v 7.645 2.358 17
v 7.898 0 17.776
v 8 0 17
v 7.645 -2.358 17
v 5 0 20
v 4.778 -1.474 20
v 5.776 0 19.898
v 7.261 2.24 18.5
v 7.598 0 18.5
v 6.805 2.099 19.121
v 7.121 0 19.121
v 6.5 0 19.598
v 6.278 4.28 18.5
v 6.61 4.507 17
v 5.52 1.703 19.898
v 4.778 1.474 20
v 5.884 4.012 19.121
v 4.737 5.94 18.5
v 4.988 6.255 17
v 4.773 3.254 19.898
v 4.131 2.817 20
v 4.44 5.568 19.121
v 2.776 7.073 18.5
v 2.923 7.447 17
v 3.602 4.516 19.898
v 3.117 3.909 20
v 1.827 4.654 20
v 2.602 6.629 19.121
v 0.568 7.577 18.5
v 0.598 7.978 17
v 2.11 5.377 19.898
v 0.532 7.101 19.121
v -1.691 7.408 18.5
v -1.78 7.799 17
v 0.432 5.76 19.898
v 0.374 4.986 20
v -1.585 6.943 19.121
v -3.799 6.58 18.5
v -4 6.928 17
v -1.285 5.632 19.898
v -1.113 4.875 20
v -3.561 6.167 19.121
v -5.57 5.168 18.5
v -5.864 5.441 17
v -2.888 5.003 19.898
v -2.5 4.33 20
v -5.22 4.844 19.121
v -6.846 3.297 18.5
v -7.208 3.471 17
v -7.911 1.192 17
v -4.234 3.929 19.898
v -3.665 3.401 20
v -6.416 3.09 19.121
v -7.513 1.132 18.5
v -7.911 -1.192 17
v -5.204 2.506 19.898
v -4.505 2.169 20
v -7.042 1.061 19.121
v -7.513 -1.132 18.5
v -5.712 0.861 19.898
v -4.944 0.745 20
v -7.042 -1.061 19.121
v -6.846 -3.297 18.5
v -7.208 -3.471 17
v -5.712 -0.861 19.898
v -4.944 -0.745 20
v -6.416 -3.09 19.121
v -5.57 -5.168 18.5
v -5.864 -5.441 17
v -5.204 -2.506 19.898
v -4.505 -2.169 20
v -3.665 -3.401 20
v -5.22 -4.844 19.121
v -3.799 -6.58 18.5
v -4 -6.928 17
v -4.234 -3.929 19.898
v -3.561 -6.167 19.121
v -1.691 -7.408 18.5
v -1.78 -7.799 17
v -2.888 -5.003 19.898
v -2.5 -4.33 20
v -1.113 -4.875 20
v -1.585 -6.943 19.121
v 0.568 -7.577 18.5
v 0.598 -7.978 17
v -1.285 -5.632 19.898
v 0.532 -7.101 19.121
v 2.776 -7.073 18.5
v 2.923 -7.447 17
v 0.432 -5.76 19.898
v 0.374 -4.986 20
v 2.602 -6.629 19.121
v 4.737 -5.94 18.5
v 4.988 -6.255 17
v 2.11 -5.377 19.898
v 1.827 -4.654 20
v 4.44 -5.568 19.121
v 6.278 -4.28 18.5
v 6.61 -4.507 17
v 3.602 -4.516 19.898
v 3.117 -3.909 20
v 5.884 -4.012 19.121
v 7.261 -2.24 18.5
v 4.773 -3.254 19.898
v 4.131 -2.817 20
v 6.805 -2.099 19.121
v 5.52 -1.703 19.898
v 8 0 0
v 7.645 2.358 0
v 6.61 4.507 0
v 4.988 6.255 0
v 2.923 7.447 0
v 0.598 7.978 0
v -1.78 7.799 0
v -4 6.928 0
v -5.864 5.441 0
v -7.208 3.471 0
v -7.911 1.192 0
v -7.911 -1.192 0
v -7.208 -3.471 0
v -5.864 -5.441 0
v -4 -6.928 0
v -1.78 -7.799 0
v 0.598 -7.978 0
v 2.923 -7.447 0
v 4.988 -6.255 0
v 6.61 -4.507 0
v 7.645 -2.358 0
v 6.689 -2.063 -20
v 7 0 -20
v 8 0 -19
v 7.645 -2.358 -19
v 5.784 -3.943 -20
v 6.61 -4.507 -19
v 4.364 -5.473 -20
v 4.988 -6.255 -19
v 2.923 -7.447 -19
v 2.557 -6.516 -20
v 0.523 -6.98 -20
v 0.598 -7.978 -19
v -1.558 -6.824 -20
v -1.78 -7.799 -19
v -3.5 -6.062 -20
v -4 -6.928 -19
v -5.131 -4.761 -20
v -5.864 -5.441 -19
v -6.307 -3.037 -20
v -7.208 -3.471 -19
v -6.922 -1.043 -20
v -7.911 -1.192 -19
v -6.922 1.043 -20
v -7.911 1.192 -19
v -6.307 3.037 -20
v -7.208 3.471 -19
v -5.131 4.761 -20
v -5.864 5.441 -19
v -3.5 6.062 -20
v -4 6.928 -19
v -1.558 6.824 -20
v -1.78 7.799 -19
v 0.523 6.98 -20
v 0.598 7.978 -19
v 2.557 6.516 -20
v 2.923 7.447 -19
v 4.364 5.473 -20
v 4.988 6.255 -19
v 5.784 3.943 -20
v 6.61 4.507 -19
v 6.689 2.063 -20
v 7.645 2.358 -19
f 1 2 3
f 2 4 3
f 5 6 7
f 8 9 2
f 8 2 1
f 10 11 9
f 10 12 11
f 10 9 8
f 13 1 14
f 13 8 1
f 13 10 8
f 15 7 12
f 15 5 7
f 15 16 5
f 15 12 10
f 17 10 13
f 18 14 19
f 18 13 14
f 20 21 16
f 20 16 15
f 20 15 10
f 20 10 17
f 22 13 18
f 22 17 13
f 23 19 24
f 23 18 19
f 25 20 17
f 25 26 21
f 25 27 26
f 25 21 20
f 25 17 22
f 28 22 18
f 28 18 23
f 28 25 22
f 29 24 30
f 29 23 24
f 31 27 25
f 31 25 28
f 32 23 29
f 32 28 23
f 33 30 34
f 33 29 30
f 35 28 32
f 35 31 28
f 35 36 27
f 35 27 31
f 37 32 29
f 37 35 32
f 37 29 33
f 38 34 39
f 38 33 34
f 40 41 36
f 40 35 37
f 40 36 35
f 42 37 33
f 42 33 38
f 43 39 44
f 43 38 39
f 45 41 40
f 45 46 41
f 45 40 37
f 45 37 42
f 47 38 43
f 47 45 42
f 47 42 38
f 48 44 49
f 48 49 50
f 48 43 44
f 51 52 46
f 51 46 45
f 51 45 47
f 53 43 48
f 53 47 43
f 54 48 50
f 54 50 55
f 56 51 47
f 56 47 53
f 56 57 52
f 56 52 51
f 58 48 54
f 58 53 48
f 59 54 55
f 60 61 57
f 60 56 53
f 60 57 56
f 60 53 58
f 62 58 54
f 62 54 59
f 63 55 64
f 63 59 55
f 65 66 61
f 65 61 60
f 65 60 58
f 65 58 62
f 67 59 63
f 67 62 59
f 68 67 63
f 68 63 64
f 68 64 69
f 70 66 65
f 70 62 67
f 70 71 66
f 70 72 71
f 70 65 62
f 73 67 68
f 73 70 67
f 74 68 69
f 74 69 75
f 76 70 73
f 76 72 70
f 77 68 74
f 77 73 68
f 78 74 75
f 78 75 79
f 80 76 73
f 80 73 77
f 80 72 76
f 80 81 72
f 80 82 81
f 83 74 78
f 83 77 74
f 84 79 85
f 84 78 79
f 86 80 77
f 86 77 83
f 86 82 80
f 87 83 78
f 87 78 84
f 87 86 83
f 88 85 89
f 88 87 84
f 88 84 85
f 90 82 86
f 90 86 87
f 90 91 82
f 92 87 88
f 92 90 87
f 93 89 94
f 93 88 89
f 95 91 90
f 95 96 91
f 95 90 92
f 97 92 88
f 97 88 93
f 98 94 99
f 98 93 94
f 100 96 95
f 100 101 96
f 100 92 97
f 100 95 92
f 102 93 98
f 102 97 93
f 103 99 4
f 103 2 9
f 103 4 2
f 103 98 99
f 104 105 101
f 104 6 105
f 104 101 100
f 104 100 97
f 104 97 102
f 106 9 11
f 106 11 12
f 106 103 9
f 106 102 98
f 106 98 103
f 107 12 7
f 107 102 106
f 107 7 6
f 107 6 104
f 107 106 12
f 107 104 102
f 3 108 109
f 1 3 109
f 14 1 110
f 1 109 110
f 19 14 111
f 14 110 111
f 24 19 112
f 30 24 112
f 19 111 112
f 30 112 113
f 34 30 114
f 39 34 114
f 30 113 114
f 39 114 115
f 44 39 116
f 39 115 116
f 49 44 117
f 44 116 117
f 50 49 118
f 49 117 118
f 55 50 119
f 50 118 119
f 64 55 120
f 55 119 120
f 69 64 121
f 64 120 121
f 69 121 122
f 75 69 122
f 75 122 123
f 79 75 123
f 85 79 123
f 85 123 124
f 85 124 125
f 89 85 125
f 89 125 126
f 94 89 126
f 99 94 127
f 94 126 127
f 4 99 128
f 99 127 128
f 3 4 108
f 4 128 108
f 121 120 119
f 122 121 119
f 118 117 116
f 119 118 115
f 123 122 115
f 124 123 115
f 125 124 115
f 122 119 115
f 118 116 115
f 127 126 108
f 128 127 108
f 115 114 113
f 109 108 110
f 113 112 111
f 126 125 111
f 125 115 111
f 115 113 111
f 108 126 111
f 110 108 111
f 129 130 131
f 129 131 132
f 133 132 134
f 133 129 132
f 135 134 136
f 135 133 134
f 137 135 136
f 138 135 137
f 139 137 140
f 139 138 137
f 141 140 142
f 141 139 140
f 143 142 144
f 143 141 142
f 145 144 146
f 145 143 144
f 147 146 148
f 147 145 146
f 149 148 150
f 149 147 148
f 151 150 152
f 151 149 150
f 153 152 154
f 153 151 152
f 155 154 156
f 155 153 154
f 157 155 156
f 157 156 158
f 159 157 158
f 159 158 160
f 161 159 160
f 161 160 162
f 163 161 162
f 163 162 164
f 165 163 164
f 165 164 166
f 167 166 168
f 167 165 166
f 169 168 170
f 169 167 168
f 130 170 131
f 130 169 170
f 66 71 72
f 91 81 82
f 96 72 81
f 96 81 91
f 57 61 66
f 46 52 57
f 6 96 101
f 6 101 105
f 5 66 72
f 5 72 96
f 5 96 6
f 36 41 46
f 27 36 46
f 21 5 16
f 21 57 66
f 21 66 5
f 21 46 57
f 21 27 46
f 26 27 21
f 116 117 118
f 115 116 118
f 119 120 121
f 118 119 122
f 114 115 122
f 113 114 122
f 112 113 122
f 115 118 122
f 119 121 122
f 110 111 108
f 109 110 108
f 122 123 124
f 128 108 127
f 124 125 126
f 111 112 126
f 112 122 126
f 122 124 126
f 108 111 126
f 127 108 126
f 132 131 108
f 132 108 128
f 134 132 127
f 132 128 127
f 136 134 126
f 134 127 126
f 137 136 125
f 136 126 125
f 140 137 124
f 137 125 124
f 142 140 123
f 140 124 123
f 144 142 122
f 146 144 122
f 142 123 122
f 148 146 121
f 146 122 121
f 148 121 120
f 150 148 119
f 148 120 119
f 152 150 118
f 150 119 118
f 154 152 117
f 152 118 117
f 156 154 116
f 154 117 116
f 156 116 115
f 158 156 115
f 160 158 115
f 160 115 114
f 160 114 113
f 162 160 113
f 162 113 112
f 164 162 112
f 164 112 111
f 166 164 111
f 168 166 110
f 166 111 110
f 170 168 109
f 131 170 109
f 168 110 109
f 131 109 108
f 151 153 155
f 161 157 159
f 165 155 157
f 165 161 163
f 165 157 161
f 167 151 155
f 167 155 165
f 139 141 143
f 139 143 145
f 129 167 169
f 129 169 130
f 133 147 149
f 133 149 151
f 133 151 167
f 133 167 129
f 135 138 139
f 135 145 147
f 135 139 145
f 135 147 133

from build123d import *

# Parameters (mm, degrees)
F0_R      = 8
F1_DEPTH  = 20
F2_R      = 3
F1_FACE_R = 8
F3_DEPTH  = 20
F4_SIZE   = 1


with BuildPart() as f1:
    # F0 (on Top) → F1 (new body)
    with BuildSketch(Plane.XY):
        Circle(F0_R)
    extrude(amount=F1_DEPTH)

    # F2
    f2_edges = [f1.edges().sort_by_distance(p)[0] for p in [
        (-8, 0, 20),
    ]]
    fillet(f2_edges, radius=F2_R)


with BuildPart() as f3:
    # F1_face (on face) → F3 (new body)
    with BuildSketch(Plane(origin=(0, 0, 0), x_dir=(1, 0, 0), z_dir=(0, 0, -1))):
        Circle(F1_FACE_R)
    extrude(amount=F3_DEPTH)

    # F4
    f4_edges = [f3.edges().sort_by_distance(p)[0] for p in [
        (-8, 0, -20),
    ]]
    chamfer(f4_edges, length=F4_SIZE)


solid = Compound([f1.part, f3.part])
